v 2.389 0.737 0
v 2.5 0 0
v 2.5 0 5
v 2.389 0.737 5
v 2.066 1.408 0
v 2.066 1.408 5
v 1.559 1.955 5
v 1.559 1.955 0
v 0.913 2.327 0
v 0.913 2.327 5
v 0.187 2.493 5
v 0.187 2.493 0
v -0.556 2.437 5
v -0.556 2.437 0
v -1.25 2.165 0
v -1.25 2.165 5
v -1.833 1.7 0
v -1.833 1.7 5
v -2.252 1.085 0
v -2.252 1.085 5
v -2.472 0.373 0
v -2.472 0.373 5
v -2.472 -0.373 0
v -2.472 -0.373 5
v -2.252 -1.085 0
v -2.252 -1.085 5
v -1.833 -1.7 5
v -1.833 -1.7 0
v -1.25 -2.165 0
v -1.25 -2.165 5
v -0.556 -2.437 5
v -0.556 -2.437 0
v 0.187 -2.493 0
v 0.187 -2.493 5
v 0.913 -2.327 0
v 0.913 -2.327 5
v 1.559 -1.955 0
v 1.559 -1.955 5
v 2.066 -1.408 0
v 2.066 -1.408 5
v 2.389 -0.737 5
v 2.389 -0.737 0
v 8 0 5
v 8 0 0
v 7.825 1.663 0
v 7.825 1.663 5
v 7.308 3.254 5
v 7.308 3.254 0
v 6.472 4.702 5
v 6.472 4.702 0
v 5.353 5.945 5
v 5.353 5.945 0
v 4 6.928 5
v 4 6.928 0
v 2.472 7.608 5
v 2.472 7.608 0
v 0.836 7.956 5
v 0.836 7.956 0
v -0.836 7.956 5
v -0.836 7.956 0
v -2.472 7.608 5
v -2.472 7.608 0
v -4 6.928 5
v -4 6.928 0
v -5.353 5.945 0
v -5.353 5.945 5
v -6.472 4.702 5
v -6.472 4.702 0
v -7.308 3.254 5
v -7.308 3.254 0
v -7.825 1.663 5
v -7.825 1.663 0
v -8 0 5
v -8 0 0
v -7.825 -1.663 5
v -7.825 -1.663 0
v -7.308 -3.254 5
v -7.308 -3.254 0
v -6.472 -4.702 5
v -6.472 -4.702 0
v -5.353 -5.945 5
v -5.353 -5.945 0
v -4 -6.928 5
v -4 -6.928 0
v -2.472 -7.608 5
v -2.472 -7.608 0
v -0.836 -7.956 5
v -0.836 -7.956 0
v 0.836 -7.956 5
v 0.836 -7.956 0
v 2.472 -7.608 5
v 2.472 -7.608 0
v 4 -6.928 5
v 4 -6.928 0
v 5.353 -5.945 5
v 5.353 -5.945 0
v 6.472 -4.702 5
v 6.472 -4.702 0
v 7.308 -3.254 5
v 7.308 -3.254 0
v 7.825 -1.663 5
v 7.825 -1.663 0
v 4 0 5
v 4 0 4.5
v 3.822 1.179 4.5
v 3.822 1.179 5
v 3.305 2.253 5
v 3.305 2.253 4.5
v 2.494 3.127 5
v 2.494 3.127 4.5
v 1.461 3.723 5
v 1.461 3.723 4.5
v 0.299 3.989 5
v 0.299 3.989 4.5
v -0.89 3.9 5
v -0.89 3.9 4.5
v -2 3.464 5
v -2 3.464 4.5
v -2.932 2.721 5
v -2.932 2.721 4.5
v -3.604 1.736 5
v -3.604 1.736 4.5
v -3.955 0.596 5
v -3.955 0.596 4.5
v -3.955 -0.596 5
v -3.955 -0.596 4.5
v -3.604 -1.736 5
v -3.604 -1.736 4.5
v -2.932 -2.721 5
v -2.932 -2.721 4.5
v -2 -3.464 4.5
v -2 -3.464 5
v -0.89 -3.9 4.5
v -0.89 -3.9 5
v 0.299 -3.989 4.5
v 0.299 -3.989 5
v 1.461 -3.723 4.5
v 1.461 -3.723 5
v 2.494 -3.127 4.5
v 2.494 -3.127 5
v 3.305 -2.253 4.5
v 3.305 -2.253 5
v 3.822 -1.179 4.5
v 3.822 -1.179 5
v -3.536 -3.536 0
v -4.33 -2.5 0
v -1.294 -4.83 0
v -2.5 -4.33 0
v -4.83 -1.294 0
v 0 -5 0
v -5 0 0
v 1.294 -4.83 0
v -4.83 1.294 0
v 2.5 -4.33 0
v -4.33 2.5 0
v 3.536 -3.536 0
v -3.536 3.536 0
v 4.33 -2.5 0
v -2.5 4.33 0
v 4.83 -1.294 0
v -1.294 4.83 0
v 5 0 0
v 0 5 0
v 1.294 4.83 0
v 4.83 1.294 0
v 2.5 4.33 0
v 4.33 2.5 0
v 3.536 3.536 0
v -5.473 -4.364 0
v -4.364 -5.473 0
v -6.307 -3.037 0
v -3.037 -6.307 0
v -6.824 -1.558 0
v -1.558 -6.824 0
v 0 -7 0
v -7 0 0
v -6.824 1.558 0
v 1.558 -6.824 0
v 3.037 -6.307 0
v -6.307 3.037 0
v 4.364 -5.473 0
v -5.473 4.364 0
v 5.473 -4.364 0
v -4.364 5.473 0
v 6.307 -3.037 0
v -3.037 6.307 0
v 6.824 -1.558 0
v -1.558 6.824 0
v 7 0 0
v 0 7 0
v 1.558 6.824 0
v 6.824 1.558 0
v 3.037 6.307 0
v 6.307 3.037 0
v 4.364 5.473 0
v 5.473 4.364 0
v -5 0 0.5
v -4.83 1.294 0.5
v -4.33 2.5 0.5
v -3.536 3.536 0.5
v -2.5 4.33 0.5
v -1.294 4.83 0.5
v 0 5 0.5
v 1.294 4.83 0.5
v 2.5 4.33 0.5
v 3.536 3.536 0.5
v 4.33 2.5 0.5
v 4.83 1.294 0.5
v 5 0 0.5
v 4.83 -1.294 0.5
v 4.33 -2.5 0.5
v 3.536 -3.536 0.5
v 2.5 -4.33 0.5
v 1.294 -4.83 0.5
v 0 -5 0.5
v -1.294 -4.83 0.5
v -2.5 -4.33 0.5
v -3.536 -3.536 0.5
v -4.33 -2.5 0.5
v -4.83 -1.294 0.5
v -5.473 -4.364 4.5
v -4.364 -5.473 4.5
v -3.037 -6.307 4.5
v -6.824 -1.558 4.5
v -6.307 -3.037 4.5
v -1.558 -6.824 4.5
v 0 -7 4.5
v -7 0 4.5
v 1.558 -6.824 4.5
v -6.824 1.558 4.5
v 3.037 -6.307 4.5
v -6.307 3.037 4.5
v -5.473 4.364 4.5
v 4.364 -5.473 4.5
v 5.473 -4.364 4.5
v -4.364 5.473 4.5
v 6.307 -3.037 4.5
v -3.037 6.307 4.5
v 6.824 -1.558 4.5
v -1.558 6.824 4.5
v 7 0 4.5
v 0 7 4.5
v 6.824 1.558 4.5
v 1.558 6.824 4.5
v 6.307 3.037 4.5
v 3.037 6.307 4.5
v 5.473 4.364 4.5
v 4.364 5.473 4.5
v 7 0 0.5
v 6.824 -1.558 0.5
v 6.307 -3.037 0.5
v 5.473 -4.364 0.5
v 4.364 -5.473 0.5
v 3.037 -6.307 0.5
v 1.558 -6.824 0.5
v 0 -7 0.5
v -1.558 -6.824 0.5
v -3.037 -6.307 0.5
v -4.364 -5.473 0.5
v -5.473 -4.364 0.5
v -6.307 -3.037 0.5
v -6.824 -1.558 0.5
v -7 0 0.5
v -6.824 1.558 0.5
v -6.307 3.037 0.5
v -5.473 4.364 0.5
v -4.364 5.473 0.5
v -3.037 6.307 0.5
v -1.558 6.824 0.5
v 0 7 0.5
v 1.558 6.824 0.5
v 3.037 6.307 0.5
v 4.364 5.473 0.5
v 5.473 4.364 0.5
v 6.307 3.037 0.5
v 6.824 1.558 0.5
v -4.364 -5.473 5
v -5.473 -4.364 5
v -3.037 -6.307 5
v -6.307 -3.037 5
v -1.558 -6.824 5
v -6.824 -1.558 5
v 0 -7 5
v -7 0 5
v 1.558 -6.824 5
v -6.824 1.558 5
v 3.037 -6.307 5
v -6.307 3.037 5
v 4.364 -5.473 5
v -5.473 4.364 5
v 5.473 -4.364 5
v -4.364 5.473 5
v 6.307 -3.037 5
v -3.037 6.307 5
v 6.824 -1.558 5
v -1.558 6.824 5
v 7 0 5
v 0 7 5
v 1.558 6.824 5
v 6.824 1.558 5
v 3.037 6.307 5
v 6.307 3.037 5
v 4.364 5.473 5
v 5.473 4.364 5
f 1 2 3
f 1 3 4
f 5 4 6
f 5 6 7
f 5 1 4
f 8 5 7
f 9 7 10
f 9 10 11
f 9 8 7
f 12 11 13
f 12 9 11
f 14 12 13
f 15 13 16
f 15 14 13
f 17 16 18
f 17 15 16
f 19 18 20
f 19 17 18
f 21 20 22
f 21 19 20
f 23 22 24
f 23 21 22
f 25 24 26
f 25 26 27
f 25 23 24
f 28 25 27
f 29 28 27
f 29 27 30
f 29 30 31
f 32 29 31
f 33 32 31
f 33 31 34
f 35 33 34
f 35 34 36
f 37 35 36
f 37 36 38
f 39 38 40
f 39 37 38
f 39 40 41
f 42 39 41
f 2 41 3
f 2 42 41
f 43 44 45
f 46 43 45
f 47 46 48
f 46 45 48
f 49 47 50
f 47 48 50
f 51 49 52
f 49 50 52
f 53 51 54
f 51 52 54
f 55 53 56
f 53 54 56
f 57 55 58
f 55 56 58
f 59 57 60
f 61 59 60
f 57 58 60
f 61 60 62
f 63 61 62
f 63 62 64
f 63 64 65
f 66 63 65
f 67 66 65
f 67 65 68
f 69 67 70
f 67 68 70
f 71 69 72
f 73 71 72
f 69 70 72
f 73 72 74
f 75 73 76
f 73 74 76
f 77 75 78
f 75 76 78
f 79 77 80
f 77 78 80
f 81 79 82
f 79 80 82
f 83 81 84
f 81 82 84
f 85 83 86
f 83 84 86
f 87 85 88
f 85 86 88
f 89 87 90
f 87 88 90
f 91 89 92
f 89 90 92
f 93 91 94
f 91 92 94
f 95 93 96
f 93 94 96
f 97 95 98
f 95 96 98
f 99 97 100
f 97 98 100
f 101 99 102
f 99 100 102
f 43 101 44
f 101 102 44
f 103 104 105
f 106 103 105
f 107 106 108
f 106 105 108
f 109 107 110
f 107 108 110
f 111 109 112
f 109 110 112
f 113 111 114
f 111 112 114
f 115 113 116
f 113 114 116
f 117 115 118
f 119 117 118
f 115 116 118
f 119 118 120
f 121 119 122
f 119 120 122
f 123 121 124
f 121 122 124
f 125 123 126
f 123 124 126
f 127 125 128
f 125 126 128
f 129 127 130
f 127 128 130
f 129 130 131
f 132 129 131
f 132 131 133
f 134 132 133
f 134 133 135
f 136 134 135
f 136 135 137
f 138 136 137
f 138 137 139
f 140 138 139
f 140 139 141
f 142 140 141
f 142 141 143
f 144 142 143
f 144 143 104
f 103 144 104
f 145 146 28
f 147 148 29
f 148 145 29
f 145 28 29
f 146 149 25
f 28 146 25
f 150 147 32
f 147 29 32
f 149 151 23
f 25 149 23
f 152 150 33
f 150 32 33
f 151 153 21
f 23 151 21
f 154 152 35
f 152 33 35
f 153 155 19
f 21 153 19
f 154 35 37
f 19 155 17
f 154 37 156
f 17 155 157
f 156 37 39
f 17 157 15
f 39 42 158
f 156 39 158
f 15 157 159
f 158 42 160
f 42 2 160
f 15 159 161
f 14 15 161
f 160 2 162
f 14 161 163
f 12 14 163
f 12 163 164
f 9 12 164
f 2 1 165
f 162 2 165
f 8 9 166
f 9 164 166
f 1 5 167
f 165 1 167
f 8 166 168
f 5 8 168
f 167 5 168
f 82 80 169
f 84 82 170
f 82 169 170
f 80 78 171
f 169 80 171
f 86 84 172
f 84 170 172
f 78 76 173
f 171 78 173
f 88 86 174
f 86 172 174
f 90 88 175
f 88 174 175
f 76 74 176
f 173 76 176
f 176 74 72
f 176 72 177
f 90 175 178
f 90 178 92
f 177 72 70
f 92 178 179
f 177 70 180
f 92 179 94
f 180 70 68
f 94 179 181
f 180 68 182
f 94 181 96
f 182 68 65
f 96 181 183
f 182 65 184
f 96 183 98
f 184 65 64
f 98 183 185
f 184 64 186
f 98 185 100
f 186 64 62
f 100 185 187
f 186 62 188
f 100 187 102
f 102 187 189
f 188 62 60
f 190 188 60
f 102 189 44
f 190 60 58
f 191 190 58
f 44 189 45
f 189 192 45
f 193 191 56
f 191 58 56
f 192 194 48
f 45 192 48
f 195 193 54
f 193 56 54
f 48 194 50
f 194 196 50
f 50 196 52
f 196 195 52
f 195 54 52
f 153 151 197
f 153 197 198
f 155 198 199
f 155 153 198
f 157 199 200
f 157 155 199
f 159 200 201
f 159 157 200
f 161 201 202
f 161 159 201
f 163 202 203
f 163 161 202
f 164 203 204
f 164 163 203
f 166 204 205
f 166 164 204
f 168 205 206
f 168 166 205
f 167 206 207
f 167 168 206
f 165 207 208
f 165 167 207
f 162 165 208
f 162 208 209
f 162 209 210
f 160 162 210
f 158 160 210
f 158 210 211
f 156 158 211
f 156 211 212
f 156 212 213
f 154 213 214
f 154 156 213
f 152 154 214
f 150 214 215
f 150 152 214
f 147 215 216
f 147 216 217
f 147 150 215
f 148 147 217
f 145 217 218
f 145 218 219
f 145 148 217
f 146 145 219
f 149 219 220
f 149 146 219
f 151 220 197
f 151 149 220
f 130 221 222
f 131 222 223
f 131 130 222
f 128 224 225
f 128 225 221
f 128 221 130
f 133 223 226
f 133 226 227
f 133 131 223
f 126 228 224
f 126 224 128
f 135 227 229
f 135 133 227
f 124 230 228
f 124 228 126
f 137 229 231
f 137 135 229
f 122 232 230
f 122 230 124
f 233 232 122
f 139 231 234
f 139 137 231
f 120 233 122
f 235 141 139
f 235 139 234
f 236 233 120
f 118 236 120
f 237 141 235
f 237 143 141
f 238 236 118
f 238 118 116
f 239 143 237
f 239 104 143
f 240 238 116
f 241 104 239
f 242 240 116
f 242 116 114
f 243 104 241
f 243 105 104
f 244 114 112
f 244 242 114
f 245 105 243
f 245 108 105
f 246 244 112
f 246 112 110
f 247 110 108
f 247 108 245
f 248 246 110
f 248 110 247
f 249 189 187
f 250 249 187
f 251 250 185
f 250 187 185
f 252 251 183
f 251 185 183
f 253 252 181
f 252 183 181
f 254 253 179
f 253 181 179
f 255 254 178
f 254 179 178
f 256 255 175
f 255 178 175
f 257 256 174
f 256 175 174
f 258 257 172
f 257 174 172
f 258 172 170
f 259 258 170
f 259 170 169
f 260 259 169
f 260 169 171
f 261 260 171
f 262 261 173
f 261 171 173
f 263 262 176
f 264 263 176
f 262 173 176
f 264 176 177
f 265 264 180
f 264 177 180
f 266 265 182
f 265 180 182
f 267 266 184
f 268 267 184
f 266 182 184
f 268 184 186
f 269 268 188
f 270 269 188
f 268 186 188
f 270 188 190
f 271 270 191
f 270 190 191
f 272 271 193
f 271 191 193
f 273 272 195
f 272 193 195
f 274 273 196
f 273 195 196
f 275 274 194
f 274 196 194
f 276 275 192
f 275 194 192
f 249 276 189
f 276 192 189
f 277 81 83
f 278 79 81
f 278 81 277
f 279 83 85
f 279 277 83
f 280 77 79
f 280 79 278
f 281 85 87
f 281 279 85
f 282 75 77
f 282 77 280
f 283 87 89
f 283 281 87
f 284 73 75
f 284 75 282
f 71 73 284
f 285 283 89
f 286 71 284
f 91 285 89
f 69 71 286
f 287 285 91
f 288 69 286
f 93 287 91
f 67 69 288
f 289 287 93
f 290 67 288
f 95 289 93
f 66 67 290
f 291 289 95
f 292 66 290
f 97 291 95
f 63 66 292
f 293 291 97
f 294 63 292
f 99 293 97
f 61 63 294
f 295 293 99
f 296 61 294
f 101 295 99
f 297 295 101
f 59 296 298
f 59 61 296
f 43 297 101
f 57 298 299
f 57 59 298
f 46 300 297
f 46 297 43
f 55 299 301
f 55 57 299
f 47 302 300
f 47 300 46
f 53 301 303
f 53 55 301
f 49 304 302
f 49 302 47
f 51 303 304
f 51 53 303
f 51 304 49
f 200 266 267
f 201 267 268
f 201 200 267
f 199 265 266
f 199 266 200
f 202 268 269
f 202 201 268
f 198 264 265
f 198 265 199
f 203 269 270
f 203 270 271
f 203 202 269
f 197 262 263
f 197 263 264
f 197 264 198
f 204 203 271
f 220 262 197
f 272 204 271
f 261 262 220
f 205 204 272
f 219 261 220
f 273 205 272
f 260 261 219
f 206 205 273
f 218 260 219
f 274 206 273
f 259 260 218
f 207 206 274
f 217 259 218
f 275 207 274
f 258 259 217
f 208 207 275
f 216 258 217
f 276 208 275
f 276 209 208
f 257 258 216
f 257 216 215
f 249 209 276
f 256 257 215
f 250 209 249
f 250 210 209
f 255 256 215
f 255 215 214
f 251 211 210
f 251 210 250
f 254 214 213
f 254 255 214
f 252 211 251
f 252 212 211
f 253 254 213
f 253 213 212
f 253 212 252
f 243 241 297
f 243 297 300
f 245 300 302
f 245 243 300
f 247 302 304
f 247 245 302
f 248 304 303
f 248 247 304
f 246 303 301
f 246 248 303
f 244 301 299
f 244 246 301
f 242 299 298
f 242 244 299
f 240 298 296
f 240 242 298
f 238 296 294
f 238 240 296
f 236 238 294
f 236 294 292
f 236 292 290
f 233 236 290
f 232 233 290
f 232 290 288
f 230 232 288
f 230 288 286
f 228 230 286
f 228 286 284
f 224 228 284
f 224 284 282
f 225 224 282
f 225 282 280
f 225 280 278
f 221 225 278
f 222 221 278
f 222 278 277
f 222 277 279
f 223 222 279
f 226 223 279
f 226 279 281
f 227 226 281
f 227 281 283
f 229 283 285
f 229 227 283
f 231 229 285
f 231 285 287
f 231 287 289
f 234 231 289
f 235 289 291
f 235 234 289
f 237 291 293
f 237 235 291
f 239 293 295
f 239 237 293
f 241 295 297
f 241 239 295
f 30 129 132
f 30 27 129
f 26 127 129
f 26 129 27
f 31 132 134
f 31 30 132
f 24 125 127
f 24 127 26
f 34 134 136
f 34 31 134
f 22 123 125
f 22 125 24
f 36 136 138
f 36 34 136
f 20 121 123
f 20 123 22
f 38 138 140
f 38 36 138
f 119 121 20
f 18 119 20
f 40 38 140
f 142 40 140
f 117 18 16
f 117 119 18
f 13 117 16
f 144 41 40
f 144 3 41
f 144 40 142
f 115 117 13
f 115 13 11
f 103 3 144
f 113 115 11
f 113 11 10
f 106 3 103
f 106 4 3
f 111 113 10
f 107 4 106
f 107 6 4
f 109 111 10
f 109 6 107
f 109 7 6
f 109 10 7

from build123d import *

# Parameters (mm, degrees)
ESQUISSE1_R             = 8
ESQUISSE1_R_2           = 7
BOSS_EXTRU_1_DEPTH      = 5
ESQUISSE1_3_R           = 7
ESQUISSE1_3_R_2         = 4
BOSS_EXTRU_2_DEPTH      = 4.5
ESQUISSE1_4_R           = 4
ESQUISSE1_4_R_2         = 2.5
BOSS_EXTRU_3_DEPTH      = 5
ESQUISSE2_R             = 7
ESQUISSE2_R_2           = 5
ENL_V_MAT_EXTRU_2_DEPTH = 0.5


with BuildPart() as part:
    # Esquisse1 → Boss.-Extru.1 (new body)
    with BuildSketch(Plane.XY):
        Circle(ESQUISSE1_R)
        Circle(ESQUISSE1_R_2, mode=Mode.SUBTRACT)
    extrude(amount=BOSS_EXTRU_1_DEPTH)

    # Esquisse1<3> → Boss.-Extru.2 (add)
    with BuildSketch(Plane.XY):
        Circle(ESQUISSE1_3_R)
        Circle(ESQUISSE1_3_R_2, mode=Mode.SUBTRACT)
    extrude(amount=BOSS_EXTRU_2_DEPTH)

    # Esquisse1<4> → Boss.-Extru.3 (add)
    with BuildSketch(Plane.XY):
        Circle(ESQUISSE1_4_R)
        Circle(ESQUISSE1_4_R_2, mode=Mode.SUBTRACT)
    extrude(amount=BOSS_EXTRU_3_DEPTH)

    # Esquisse2 → Enlèv. mat.-Extru.2 (cut)
    with BuildSketch(Plane(origin=(0, 0, 0), x_dir=(-1, 0, 0), z_dir=(0, 0, -1))):
        Circle(ESQUISSE2_R)
        Circle(ESQUISSE2_R_2, mode=Mode.SUBTRACT)
    extrude(amount=-ENL_V_MAT_EXTRU_2_DEPTH, mode=Mode.SUBTRACT)


solid = part.part
